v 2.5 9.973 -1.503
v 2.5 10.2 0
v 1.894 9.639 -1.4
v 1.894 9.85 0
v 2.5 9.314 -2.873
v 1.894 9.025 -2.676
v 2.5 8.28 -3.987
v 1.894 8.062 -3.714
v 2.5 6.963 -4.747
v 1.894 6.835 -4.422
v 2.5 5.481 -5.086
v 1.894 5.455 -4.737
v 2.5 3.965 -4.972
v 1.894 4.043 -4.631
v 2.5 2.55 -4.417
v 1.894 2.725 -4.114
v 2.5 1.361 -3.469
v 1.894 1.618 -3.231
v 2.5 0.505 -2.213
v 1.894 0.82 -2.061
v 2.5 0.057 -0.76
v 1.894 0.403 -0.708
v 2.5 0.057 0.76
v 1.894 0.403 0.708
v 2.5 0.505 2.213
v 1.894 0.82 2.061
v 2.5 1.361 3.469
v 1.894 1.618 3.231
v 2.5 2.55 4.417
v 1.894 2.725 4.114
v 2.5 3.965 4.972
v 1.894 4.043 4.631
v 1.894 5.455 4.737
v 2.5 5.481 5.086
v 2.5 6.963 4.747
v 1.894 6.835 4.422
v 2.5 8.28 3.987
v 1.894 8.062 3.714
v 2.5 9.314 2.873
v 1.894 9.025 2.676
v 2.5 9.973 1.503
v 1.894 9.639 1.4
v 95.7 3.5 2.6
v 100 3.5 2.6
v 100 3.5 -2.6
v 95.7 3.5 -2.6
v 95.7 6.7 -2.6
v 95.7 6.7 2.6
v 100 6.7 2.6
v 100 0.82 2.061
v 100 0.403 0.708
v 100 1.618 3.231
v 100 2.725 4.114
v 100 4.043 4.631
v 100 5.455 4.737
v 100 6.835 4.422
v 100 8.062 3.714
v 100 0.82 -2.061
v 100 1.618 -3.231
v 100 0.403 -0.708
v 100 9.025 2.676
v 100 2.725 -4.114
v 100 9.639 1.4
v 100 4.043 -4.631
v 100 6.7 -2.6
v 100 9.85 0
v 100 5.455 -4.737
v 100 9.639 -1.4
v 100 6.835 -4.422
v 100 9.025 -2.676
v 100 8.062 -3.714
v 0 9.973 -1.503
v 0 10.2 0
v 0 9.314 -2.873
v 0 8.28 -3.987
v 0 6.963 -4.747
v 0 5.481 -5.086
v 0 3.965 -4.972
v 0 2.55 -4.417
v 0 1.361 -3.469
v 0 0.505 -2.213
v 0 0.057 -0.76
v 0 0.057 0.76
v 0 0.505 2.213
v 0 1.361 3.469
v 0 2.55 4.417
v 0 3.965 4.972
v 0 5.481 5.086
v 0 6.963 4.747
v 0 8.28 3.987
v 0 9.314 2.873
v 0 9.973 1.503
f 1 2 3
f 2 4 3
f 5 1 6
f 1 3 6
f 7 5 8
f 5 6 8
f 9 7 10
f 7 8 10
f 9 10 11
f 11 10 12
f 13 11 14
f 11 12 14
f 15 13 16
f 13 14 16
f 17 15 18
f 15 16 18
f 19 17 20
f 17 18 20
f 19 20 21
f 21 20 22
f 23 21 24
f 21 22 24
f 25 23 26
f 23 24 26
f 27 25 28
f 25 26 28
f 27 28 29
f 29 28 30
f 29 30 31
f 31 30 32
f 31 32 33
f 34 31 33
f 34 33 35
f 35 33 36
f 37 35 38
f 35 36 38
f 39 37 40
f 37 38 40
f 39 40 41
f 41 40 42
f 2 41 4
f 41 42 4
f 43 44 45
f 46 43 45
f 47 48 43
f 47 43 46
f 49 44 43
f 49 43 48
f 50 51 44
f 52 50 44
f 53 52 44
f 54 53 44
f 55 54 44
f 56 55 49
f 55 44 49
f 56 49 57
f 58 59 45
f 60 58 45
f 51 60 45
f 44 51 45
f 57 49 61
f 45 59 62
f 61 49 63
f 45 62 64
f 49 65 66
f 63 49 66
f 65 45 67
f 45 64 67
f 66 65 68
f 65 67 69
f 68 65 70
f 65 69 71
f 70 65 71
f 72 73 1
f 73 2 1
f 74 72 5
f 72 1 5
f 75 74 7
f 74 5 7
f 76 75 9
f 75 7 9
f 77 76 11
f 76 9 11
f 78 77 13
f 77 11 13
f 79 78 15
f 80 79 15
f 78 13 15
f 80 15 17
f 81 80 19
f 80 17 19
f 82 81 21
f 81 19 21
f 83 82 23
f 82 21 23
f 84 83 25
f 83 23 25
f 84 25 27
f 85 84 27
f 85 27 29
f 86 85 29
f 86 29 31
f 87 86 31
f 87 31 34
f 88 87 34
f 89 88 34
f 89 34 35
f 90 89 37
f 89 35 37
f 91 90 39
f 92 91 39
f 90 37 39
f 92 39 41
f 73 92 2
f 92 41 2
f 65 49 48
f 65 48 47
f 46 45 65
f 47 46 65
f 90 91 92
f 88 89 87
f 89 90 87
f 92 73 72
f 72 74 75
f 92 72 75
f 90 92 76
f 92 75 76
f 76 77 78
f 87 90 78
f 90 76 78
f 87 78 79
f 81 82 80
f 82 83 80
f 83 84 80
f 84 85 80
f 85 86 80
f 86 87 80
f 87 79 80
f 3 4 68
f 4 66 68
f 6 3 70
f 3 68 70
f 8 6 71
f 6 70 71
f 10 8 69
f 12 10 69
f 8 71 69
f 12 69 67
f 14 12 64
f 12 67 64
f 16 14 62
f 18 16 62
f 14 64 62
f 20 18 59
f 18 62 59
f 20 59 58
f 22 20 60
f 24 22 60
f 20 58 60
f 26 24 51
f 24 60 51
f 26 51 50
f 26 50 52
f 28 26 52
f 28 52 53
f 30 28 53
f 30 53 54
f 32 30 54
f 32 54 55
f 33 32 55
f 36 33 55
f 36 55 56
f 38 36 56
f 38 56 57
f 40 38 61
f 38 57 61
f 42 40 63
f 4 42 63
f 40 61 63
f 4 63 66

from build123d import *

# Parameters (mm, degrees)
SKETCH4_W          = 5.2
SKETCH4_H          = 3.2
CUT_EXTRUDE1_DEPTH = 4.3


with BuildPart() as part:
    # Sketch1 → Revolve2 (revolve)
    with BuildSketch(Plane.XY, mode=Mode.PRIVATE) as revolve2_sk:
        Polygon((0, 0), (2.5, 0), (1.893782217, 0.35), (100, 0.35), (100, 5.1), (0, 5.1), align=None)
    revolve(revolve2_sk.sketch.rotate(Axis((100, 5.1, 0), (-1, 0, 0)), 180), axis=Axis((100, 5.1, 0), (-1, 0, 0)))

    # Sketch4 → Cut-Extrude1 (cut)
    with BuildSketch(Plane(origin=(100, 0, 0), x_dir=(0, 0, -1), z_dir=(1, 0, 0))):
        with Locations((0, 5.1)):
            Rectangle(SKETCH4_W, SKETCH4_H)
    extrude(amount=-CUT_EXTRUDE1_DEPTH, mode=Mode.SUBTRACT)


solid = part.part
